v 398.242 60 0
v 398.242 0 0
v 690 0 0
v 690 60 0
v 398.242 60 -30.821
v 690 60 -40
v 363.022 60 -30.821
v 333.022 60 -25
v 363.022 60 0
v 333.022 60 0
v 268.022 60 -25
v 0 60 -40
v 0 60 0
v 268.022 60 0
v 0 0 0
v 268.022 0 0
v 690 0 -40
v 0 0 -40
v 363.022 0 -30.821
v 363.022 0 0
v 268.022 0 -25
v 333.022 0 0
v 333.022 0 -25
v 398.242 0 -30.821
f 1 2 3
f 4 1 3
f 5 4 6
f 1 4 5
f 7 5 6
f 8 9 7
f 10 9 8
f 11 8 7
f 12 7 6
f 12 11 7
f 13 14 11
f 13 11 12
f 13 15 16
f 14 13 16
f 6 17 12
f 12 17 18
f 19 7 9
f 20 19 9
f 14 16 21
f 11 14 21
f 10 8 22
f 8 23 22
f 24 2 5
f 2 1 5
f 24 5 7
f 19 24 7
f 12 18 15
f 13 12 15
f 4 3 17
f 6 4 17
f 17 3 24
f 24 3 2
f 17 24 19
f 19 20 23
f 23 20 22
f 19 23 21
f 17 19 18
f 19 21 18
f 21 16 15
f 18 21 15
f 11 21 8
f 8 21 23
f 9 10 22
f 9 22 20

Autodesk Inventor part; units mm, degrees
ref_plane "YZ Plane" through (0, 0, 0) normal (1, 0, 0) x (0, 1, 0)
ref_plane "XZ Plane" through (0, 0, 0) normal (0, 1, 0) x (-1, 0, 0)
ref_plane "XY Plane" through (0, 0, 0) normal (0, 0, 1) x (1, 0, 0)
sketch "Sketch1" plane through (0, 0, 0) normal (0, 1, 0) x (-1, 0, 0)
  line L0 (0, 0) -> (-690, 0)
  line L1 (-690, 0) -> (-690, -40)
  line L2 (-690, -40) -> (0, -40)
  line L3 (0, -40) -> (0, 0)
  dimension "d0" = 690
  dimension "d1" = 40
extrude "Extrusion1" add sketch "Sketch1" along normal blind 60
sketch "Sketch3" plane through (0, 60, 0) normal (0, 1, 0) x (1, 0, 0)
  circle A0 centre (380.6828, 16.7692) radius 7.5
  line L0 (368.0221, 25.8207) -> (368.0221, 1.9407)
  line L1 (393.2421, 25.8207) -> (368.0221, 25.8207)
  line L2 (393.2421, 1.9407) -> (393.2421, 25.8207)
  line L3 (368.0221, 1.9407) -> (393.2421, 1.9407)
  line L4 (0, 0) -> (690, 0)
  line L5 (690, 40) -> (0, 40)
  line L6 (0, 40) -> (0, 0)
  line L7 (368.0221, 1.9407) -> (363.0221, 1.9407)
  line L8 (368.0221, 25.8207) -> (368.0221, 30.8207)
  line L9 (393.2421, 1.9407) -> (398.2421, 1.9407)
  line L10 (363.0221, 1.9407) -> (363.0221, 0)
  line L11 (398.2421, 1.9407) -> (398.2421, 0)
  line L12 (363.0221, 0) -> (398.2421, 0)
  line L13 (398.2421, 0) -> (398.2421, 30.8207)
  line L14 (398.2421, 30.8207) -> (363.0221, 30.8207)
  line L15 (363.0221, 30.8207) -> (363.0221, 0)
  point P0 (0, 40)
  dimension "d6" = 5
  dimension "d7" = 5
  dimension "d8" = 5
extrude "Extrusion3" cut sketch "Sketch3" against normal blind 60 contours A0 | L1 L2 L3 L0 | L8 L14 L13 L9 L2 L1 | L0 L7 L15 L14 L8 | L3 L9 L11 L4 L10 L7
sketch "Sketch4" plane through (0, 0, 0) normal (0, -1, 0) x (1, 0, 0)
  line L0 (0, 0) -> (363.0221, 0) projected
  line L1 (333.0221, 0) -> (268.0221, 0)
  line L2 (268.0221, 0) -> (268.0221, -25)
  line L3 (268.0221, -25) -> (333.0221, -25)
  line L4 (333.0221, -25) -> (333.0221, 0)
  line L5 (363.0221, -30.8207) -> (363.0221, 0) projected
  dimension "d11" = 65
  dimension "d12" = 25
  dimension "d13" = 30
extrude "Extrusion4" cut sketch "Sketch4" against normal blind 60
properties part number "Cadru_4"
